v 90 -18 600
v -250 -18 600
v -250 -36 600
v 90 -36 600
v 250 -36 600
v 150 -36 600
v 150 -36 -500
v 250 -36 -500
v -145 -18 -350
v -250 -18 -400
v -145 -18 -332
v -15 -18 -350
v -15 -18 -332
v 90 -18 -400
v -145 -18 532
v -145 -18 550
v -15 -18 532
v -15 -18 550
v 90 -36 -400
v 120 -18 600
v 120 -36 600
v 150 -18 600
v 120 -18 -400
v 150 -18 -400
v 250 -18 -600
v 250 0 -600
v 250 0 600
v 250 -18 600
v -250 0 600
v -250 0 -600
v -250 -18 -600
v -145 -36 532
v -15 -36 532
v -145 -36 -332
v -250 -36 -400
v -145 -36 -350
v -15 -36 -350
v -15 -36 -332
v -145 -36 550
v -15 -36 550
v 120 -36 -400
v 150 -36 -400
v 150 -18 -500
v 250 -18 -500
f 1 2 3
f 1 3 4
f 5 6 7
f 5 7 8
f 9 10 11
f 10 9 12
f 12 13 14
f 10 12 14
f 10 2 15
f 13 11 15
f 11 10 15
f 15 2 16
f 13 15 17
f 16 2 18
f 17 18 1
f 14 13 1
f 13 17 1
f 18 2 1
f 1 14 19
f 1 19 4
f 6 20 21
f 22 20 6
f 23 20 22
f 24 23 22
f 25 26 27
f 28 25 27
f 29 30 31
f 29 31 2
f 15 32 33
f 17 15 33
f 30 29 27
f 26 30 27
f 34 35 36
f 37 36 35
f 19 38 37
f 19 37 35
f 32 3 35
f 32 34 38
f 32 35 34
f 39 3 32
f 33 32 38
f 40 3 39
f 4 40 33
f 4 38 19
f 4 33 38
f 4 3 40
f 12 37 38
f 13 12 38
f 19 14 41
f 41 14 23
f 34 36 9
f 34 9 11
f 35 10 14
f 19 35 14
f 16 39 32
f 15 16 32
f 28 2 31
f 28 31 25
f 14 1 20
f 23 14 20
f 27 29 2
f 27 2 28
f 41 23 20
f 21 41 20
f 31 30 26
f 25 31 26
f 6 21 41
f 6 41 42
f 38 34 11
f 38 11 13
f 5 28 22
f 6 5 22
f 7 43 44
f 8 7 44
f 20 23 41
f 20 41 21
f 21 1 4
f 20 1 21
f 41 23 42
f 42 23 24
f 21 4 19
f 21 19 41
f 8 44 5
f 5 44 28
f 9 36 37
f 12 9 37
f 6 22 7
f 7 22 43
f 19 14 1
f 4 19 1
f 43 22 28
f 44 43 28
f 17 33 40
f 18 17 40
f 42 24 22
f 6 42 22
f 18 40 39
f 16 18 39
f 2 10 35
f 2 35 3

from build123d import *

# Parameters (mm, degrees)
F0_W     = 500
F0_H     = 1200
F1_DEPTH = 18
F2_W     = 340
F2_H     = 1000
F3_DEPTH = 18
F2_W_2   = 30
F4_DEPTH = 18
F5_DEPTH = 18
F6_DEPTH = 18
F7_W     = 130
F7_H     = 18
F8_DEPTH = 18


with BuildPart() as f1:
    # F0 (on Front) → F1 (new body)
    with BuildSketch(Plane.XZ):
        Rectangle(F0_W, F0_H)
    extrude(amount=F1_DEPTH)


with BuildPart() as f3:
    # F2 (on face) → F3 (new body)
    with BuildSketch(Plane.XZ.offset(18)):
        with Locations((-80, 100)):
            Rectangle(F2_W, F2_H)
    extrude(amount=F3_DEPTH)

    # F7 (on face) → F8 (cut, through all)
    with BuildSketch(Plane.XZ.offset(36)):
        Polygon((-80, 550), (-145, 550), (-145, 532), (-15, 532), (-15, 550), align=None)
        with Locations((-80, -341)):
            Rectangle(F7_W, F7_H)
    extrude(amount=-F8_DEPTH, mode=Mode.SUBTRACT)


with BuildPart() as f4:
    # F2 (on face) → F4 (new body)
    with BuildSketch(Plane.XZ.offset(18)):
        with Locations((105, 100)):
            Rectangle(F2_W_2, F2_H)
    extrude(amount=F4_DEPTH)


with BuildPart() as f5:
    # F2 (on face) → F5 (new body)
    with BuildSketch(Plane.XZ.offset(18)):
        with Locations((135, 100)):
            Rectangle(F2_W_2, F2_H)
    extrude(amount=F5_DEPTH)


with BuildPart() as f6:
    # F2 (on face) → F6 (new body)
    with BuildSketch(Plane.XZ.offset(18)):
        Polygon((250, 600), (150, 600), (150, -400), (150, -500), (250, -500), align=None)
    extrude(amount=F6_DEPTH)


solid = Compound([f1.part, f3.part, f4.part, f5.part, f6.part])
